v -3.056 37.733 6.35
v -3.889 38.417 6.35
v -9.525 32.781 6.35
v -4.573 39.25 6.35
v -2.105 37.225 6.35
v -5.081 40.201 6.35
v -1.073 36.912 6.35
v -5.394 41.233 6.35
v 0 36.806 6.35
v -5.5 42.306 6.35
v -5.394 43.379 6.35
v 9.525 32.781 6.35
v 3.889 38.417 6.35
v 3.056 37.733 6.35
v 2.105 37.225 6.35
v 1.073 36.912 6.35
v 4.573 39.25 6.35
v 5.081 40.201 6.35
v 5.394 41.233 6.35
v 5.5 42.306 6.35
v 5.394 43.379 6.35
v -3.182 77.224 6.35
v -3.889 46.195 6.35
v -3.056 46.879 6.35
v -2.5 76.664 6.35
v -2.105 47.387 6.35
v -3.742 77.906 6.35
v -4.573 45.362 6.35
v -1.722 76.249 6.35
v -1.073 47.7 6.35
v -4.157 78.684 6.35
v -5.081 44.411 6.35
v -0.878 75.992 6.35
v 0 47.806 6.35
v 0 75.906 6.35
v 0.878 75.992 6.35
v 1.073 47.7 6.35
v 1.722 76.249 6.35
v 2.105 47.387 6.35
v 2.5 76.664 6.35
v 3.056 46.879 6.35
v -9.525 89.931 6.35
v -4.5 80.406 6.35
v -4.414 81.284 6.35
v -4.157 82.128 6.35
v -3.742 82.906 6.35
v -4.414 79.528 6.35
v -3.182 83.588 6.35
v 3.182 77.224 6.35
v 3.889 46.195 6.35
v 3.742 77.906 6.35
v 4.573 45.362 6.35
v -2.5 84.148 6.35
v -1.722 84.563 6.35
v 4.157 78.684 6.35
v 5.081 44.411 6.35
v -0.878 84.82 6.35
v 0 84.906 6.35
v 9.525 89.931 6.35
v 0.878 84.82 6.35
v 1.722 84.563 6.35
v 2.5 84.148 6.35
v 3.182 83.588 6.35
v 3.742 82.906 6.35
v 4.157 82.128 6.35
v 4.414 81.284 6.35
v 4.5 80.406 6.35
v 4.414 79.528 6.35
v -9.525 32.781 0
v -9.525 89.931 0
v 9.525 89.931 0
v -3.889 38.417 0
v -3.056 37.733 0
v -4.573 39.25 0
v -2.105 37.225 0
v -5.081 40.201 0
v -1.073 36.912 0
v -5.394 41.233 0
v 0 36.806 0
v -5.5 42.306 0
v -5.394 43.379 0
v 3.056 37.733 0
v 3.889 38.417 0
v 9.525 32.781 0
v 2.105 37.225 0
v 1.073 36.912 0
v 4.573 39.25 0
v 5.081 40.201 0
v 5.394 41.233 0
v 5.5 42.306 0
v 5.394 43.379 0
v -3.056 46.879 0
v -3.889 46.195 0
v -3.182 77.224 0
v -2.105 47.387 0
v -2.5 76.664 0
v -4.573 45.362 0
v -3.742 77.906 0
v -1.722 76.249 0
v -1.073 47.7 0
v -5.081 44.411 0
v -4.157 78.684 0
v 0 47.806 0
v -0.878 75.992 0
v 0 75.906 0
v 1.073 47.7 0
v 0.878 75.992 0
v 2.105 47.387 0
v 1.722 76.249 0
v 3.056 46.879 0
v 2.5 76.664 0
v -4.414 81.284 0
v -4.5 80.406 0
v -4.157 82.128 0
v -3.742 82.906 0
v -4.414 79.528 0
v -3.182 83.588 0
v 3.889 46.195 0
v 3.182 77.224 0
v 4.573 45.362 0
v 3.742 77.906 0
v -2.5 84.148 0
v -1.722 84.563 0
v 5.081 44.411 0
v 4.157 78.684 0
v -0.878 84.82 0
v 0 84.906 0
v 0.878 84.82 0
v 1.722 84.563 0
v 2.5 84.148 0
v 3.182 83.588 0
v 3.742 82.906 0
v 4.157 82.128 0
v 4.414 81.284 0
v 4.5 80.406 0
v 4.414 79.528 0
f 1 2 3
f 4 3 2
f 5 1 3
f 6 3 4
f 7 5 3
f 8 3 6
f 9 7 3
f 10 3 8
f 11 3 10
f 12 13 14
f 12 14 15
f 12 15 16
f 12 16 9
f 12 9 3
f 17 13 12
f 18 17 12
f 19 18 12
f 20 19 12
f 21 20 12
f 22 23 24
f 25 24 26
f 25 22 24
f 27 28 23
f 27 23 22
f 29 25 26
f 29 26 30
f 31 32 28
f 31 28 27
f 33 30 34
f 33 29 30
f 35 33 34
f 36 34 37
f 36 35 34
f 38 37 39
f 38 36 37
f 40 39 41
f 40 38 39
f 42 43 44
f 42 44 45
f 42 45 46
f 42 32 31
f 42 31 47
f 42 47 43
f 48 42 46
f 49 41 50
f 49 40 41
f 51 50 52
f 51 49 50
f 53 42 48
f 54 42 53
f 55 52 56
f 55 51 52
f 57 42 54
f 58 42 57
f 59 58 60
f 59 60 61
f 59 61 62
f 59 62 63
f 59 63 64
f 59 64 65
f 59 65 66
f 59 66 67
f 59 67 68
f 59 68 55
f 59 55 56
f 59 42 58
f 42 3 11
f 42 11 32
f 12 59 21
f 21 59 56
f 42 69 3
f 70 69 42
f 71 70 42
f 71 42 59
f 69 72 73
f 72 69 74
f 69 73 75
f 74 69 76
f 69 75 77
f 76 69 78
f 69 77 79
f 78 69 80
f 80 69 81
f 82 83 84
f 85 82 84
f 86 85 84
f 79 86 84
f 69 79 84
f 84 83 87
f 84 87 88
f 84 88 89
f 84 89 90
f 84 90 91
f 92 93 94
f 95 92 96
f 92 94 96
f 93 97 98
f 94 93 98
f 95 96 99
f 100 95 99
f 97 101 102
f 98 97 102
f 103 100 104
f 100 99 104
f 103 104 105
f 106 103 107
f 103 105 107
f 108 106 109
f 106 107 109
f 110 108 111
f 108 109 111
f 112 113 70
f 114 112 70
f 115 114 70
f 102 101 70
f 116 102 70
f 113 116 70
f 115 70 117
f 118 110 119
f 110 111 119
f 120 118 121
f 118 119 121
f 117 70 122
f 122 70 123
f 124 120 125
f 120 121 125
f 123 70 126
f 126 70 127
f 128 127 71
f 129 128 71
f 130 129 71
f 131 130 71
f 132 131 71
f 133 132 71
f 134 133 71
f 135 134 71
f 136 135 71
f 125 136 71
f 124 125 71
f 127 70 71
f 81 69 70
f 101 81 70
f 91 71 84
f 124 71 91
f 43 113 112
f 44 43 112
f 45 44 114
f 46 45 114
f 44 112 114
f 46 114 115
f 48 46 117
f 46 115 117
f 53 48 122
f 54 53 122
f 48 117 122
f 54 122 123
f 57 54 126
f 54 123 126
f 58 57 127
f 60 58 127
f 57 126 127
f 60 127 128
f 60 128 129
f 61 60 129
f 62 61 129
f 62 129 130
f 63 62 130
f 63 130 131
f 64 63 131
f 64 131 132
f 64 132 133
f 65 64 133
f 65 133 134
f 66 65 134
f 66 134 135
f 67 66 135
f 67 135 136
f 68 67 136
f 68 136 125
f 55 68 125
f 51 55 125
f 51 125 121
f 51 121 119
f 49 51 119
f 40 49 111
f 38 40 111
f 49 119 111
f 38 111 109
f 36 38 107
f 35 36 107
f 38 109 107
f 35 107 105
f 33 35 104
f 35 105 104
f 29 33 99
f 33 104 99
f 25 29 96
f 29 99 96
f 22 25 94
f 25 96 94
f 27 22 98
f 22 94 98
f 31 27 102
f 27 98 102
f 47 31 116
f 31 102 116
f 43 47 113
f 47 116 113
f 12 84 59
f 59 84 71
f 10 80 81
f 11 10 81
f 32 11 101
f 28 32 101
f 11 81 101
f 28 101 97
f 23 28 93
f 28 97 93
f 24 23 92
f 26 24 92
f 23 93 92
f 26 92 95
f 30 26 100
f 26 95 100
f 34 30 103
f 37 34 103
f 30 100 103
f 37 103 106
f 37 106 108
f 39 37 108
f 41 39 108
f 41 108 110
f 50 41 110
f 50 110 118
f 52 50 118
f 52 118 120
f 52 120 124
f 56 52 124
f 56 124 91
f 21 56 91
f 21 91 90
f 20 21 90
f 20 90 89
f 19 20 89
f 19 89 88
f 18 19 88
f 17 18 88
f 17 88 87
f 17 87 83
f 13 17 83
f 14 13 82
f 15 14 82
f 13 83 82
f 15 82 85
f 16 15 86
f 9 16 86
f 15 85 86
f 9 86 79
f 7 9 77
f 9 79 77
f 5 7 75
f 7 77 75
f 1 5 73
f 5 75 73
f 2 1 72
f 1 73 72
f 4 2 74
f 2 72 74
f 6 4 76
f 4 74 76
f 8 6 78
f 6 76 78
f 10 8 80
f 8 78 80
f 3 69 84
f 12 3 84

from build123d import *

# Parameters (mm, degrees)
SKETCH1_W                 = 19.05
SKETCH1_H                 = 57.15
BOSS_EXTRUDE1_DEPTH       = 6.35
M10_CLEARANCE_HOLE1_D     = 11
M10_CLEARANCE_HOLE1_DEPTH = 25.4
M10_CLEARANCE_HOLE1_TIP   = 3.304733405
M8_CLEARANCE_HOLE2_D      = 9
M8_CLEARANCE_HOLE2_DEPTH  = 25.4
M8_CLEARANCE_HOLE2_TIP    = 2.703872786


with BuildPart() as part:
    # Sketch1 → Boss-Extrude1 (new body)
    with BuildSketch(Plane.XY):
        with Locations((0, 61.356)):
            Rectangle(SKETCH1_W, SKETCH1_H)
    extrude(amount=BOSS_EXTRUDE1_DEPTH)

    # M10 Clearance Hole1
    with Locations(Plane.XY.offset(6.35)):
        with Locations((0, 42.306)):
            Hole(M10_CLEARANCE_HOLE1_D / 2, depth=M10_CLEARANCE_HOLE1_DEPTH)
            with Locations((0, 0, -(M10_CLEARANCE_HOLE1_DEPTH + M10_CLEARANCE_HOLE1_TIP / 2))):  # 118° drill point
                Cone(0, M10_CLEARANCE_HOLE1_D / 2, M10_CLEARANCE_HOLE1_TIP, mode=Mode.SUBTRACT)

    # M8 Clearance Hole2
    with Locations(Plane.XY.offset(6.35)):
        with Locations((0, 80.406)):
            Hole(M8_CLEARANCE_HOLE2_D / 2, depth=M8_CLEARANCE_HOLE2_DEPTH)
            with Locations((0, 0, -(M8_CLEARANCE_HOLE2_DEPTH + M8_CLEARANCE_HOLE2_TIP / 2))):  # 118° drill point
                Cone(0, M8_CLEARANCE_HOLE2_D / 2, M8_CLEARANCE_HOLE2_TIP, mode=Mode.SUBTRACT)


solid = part.part
